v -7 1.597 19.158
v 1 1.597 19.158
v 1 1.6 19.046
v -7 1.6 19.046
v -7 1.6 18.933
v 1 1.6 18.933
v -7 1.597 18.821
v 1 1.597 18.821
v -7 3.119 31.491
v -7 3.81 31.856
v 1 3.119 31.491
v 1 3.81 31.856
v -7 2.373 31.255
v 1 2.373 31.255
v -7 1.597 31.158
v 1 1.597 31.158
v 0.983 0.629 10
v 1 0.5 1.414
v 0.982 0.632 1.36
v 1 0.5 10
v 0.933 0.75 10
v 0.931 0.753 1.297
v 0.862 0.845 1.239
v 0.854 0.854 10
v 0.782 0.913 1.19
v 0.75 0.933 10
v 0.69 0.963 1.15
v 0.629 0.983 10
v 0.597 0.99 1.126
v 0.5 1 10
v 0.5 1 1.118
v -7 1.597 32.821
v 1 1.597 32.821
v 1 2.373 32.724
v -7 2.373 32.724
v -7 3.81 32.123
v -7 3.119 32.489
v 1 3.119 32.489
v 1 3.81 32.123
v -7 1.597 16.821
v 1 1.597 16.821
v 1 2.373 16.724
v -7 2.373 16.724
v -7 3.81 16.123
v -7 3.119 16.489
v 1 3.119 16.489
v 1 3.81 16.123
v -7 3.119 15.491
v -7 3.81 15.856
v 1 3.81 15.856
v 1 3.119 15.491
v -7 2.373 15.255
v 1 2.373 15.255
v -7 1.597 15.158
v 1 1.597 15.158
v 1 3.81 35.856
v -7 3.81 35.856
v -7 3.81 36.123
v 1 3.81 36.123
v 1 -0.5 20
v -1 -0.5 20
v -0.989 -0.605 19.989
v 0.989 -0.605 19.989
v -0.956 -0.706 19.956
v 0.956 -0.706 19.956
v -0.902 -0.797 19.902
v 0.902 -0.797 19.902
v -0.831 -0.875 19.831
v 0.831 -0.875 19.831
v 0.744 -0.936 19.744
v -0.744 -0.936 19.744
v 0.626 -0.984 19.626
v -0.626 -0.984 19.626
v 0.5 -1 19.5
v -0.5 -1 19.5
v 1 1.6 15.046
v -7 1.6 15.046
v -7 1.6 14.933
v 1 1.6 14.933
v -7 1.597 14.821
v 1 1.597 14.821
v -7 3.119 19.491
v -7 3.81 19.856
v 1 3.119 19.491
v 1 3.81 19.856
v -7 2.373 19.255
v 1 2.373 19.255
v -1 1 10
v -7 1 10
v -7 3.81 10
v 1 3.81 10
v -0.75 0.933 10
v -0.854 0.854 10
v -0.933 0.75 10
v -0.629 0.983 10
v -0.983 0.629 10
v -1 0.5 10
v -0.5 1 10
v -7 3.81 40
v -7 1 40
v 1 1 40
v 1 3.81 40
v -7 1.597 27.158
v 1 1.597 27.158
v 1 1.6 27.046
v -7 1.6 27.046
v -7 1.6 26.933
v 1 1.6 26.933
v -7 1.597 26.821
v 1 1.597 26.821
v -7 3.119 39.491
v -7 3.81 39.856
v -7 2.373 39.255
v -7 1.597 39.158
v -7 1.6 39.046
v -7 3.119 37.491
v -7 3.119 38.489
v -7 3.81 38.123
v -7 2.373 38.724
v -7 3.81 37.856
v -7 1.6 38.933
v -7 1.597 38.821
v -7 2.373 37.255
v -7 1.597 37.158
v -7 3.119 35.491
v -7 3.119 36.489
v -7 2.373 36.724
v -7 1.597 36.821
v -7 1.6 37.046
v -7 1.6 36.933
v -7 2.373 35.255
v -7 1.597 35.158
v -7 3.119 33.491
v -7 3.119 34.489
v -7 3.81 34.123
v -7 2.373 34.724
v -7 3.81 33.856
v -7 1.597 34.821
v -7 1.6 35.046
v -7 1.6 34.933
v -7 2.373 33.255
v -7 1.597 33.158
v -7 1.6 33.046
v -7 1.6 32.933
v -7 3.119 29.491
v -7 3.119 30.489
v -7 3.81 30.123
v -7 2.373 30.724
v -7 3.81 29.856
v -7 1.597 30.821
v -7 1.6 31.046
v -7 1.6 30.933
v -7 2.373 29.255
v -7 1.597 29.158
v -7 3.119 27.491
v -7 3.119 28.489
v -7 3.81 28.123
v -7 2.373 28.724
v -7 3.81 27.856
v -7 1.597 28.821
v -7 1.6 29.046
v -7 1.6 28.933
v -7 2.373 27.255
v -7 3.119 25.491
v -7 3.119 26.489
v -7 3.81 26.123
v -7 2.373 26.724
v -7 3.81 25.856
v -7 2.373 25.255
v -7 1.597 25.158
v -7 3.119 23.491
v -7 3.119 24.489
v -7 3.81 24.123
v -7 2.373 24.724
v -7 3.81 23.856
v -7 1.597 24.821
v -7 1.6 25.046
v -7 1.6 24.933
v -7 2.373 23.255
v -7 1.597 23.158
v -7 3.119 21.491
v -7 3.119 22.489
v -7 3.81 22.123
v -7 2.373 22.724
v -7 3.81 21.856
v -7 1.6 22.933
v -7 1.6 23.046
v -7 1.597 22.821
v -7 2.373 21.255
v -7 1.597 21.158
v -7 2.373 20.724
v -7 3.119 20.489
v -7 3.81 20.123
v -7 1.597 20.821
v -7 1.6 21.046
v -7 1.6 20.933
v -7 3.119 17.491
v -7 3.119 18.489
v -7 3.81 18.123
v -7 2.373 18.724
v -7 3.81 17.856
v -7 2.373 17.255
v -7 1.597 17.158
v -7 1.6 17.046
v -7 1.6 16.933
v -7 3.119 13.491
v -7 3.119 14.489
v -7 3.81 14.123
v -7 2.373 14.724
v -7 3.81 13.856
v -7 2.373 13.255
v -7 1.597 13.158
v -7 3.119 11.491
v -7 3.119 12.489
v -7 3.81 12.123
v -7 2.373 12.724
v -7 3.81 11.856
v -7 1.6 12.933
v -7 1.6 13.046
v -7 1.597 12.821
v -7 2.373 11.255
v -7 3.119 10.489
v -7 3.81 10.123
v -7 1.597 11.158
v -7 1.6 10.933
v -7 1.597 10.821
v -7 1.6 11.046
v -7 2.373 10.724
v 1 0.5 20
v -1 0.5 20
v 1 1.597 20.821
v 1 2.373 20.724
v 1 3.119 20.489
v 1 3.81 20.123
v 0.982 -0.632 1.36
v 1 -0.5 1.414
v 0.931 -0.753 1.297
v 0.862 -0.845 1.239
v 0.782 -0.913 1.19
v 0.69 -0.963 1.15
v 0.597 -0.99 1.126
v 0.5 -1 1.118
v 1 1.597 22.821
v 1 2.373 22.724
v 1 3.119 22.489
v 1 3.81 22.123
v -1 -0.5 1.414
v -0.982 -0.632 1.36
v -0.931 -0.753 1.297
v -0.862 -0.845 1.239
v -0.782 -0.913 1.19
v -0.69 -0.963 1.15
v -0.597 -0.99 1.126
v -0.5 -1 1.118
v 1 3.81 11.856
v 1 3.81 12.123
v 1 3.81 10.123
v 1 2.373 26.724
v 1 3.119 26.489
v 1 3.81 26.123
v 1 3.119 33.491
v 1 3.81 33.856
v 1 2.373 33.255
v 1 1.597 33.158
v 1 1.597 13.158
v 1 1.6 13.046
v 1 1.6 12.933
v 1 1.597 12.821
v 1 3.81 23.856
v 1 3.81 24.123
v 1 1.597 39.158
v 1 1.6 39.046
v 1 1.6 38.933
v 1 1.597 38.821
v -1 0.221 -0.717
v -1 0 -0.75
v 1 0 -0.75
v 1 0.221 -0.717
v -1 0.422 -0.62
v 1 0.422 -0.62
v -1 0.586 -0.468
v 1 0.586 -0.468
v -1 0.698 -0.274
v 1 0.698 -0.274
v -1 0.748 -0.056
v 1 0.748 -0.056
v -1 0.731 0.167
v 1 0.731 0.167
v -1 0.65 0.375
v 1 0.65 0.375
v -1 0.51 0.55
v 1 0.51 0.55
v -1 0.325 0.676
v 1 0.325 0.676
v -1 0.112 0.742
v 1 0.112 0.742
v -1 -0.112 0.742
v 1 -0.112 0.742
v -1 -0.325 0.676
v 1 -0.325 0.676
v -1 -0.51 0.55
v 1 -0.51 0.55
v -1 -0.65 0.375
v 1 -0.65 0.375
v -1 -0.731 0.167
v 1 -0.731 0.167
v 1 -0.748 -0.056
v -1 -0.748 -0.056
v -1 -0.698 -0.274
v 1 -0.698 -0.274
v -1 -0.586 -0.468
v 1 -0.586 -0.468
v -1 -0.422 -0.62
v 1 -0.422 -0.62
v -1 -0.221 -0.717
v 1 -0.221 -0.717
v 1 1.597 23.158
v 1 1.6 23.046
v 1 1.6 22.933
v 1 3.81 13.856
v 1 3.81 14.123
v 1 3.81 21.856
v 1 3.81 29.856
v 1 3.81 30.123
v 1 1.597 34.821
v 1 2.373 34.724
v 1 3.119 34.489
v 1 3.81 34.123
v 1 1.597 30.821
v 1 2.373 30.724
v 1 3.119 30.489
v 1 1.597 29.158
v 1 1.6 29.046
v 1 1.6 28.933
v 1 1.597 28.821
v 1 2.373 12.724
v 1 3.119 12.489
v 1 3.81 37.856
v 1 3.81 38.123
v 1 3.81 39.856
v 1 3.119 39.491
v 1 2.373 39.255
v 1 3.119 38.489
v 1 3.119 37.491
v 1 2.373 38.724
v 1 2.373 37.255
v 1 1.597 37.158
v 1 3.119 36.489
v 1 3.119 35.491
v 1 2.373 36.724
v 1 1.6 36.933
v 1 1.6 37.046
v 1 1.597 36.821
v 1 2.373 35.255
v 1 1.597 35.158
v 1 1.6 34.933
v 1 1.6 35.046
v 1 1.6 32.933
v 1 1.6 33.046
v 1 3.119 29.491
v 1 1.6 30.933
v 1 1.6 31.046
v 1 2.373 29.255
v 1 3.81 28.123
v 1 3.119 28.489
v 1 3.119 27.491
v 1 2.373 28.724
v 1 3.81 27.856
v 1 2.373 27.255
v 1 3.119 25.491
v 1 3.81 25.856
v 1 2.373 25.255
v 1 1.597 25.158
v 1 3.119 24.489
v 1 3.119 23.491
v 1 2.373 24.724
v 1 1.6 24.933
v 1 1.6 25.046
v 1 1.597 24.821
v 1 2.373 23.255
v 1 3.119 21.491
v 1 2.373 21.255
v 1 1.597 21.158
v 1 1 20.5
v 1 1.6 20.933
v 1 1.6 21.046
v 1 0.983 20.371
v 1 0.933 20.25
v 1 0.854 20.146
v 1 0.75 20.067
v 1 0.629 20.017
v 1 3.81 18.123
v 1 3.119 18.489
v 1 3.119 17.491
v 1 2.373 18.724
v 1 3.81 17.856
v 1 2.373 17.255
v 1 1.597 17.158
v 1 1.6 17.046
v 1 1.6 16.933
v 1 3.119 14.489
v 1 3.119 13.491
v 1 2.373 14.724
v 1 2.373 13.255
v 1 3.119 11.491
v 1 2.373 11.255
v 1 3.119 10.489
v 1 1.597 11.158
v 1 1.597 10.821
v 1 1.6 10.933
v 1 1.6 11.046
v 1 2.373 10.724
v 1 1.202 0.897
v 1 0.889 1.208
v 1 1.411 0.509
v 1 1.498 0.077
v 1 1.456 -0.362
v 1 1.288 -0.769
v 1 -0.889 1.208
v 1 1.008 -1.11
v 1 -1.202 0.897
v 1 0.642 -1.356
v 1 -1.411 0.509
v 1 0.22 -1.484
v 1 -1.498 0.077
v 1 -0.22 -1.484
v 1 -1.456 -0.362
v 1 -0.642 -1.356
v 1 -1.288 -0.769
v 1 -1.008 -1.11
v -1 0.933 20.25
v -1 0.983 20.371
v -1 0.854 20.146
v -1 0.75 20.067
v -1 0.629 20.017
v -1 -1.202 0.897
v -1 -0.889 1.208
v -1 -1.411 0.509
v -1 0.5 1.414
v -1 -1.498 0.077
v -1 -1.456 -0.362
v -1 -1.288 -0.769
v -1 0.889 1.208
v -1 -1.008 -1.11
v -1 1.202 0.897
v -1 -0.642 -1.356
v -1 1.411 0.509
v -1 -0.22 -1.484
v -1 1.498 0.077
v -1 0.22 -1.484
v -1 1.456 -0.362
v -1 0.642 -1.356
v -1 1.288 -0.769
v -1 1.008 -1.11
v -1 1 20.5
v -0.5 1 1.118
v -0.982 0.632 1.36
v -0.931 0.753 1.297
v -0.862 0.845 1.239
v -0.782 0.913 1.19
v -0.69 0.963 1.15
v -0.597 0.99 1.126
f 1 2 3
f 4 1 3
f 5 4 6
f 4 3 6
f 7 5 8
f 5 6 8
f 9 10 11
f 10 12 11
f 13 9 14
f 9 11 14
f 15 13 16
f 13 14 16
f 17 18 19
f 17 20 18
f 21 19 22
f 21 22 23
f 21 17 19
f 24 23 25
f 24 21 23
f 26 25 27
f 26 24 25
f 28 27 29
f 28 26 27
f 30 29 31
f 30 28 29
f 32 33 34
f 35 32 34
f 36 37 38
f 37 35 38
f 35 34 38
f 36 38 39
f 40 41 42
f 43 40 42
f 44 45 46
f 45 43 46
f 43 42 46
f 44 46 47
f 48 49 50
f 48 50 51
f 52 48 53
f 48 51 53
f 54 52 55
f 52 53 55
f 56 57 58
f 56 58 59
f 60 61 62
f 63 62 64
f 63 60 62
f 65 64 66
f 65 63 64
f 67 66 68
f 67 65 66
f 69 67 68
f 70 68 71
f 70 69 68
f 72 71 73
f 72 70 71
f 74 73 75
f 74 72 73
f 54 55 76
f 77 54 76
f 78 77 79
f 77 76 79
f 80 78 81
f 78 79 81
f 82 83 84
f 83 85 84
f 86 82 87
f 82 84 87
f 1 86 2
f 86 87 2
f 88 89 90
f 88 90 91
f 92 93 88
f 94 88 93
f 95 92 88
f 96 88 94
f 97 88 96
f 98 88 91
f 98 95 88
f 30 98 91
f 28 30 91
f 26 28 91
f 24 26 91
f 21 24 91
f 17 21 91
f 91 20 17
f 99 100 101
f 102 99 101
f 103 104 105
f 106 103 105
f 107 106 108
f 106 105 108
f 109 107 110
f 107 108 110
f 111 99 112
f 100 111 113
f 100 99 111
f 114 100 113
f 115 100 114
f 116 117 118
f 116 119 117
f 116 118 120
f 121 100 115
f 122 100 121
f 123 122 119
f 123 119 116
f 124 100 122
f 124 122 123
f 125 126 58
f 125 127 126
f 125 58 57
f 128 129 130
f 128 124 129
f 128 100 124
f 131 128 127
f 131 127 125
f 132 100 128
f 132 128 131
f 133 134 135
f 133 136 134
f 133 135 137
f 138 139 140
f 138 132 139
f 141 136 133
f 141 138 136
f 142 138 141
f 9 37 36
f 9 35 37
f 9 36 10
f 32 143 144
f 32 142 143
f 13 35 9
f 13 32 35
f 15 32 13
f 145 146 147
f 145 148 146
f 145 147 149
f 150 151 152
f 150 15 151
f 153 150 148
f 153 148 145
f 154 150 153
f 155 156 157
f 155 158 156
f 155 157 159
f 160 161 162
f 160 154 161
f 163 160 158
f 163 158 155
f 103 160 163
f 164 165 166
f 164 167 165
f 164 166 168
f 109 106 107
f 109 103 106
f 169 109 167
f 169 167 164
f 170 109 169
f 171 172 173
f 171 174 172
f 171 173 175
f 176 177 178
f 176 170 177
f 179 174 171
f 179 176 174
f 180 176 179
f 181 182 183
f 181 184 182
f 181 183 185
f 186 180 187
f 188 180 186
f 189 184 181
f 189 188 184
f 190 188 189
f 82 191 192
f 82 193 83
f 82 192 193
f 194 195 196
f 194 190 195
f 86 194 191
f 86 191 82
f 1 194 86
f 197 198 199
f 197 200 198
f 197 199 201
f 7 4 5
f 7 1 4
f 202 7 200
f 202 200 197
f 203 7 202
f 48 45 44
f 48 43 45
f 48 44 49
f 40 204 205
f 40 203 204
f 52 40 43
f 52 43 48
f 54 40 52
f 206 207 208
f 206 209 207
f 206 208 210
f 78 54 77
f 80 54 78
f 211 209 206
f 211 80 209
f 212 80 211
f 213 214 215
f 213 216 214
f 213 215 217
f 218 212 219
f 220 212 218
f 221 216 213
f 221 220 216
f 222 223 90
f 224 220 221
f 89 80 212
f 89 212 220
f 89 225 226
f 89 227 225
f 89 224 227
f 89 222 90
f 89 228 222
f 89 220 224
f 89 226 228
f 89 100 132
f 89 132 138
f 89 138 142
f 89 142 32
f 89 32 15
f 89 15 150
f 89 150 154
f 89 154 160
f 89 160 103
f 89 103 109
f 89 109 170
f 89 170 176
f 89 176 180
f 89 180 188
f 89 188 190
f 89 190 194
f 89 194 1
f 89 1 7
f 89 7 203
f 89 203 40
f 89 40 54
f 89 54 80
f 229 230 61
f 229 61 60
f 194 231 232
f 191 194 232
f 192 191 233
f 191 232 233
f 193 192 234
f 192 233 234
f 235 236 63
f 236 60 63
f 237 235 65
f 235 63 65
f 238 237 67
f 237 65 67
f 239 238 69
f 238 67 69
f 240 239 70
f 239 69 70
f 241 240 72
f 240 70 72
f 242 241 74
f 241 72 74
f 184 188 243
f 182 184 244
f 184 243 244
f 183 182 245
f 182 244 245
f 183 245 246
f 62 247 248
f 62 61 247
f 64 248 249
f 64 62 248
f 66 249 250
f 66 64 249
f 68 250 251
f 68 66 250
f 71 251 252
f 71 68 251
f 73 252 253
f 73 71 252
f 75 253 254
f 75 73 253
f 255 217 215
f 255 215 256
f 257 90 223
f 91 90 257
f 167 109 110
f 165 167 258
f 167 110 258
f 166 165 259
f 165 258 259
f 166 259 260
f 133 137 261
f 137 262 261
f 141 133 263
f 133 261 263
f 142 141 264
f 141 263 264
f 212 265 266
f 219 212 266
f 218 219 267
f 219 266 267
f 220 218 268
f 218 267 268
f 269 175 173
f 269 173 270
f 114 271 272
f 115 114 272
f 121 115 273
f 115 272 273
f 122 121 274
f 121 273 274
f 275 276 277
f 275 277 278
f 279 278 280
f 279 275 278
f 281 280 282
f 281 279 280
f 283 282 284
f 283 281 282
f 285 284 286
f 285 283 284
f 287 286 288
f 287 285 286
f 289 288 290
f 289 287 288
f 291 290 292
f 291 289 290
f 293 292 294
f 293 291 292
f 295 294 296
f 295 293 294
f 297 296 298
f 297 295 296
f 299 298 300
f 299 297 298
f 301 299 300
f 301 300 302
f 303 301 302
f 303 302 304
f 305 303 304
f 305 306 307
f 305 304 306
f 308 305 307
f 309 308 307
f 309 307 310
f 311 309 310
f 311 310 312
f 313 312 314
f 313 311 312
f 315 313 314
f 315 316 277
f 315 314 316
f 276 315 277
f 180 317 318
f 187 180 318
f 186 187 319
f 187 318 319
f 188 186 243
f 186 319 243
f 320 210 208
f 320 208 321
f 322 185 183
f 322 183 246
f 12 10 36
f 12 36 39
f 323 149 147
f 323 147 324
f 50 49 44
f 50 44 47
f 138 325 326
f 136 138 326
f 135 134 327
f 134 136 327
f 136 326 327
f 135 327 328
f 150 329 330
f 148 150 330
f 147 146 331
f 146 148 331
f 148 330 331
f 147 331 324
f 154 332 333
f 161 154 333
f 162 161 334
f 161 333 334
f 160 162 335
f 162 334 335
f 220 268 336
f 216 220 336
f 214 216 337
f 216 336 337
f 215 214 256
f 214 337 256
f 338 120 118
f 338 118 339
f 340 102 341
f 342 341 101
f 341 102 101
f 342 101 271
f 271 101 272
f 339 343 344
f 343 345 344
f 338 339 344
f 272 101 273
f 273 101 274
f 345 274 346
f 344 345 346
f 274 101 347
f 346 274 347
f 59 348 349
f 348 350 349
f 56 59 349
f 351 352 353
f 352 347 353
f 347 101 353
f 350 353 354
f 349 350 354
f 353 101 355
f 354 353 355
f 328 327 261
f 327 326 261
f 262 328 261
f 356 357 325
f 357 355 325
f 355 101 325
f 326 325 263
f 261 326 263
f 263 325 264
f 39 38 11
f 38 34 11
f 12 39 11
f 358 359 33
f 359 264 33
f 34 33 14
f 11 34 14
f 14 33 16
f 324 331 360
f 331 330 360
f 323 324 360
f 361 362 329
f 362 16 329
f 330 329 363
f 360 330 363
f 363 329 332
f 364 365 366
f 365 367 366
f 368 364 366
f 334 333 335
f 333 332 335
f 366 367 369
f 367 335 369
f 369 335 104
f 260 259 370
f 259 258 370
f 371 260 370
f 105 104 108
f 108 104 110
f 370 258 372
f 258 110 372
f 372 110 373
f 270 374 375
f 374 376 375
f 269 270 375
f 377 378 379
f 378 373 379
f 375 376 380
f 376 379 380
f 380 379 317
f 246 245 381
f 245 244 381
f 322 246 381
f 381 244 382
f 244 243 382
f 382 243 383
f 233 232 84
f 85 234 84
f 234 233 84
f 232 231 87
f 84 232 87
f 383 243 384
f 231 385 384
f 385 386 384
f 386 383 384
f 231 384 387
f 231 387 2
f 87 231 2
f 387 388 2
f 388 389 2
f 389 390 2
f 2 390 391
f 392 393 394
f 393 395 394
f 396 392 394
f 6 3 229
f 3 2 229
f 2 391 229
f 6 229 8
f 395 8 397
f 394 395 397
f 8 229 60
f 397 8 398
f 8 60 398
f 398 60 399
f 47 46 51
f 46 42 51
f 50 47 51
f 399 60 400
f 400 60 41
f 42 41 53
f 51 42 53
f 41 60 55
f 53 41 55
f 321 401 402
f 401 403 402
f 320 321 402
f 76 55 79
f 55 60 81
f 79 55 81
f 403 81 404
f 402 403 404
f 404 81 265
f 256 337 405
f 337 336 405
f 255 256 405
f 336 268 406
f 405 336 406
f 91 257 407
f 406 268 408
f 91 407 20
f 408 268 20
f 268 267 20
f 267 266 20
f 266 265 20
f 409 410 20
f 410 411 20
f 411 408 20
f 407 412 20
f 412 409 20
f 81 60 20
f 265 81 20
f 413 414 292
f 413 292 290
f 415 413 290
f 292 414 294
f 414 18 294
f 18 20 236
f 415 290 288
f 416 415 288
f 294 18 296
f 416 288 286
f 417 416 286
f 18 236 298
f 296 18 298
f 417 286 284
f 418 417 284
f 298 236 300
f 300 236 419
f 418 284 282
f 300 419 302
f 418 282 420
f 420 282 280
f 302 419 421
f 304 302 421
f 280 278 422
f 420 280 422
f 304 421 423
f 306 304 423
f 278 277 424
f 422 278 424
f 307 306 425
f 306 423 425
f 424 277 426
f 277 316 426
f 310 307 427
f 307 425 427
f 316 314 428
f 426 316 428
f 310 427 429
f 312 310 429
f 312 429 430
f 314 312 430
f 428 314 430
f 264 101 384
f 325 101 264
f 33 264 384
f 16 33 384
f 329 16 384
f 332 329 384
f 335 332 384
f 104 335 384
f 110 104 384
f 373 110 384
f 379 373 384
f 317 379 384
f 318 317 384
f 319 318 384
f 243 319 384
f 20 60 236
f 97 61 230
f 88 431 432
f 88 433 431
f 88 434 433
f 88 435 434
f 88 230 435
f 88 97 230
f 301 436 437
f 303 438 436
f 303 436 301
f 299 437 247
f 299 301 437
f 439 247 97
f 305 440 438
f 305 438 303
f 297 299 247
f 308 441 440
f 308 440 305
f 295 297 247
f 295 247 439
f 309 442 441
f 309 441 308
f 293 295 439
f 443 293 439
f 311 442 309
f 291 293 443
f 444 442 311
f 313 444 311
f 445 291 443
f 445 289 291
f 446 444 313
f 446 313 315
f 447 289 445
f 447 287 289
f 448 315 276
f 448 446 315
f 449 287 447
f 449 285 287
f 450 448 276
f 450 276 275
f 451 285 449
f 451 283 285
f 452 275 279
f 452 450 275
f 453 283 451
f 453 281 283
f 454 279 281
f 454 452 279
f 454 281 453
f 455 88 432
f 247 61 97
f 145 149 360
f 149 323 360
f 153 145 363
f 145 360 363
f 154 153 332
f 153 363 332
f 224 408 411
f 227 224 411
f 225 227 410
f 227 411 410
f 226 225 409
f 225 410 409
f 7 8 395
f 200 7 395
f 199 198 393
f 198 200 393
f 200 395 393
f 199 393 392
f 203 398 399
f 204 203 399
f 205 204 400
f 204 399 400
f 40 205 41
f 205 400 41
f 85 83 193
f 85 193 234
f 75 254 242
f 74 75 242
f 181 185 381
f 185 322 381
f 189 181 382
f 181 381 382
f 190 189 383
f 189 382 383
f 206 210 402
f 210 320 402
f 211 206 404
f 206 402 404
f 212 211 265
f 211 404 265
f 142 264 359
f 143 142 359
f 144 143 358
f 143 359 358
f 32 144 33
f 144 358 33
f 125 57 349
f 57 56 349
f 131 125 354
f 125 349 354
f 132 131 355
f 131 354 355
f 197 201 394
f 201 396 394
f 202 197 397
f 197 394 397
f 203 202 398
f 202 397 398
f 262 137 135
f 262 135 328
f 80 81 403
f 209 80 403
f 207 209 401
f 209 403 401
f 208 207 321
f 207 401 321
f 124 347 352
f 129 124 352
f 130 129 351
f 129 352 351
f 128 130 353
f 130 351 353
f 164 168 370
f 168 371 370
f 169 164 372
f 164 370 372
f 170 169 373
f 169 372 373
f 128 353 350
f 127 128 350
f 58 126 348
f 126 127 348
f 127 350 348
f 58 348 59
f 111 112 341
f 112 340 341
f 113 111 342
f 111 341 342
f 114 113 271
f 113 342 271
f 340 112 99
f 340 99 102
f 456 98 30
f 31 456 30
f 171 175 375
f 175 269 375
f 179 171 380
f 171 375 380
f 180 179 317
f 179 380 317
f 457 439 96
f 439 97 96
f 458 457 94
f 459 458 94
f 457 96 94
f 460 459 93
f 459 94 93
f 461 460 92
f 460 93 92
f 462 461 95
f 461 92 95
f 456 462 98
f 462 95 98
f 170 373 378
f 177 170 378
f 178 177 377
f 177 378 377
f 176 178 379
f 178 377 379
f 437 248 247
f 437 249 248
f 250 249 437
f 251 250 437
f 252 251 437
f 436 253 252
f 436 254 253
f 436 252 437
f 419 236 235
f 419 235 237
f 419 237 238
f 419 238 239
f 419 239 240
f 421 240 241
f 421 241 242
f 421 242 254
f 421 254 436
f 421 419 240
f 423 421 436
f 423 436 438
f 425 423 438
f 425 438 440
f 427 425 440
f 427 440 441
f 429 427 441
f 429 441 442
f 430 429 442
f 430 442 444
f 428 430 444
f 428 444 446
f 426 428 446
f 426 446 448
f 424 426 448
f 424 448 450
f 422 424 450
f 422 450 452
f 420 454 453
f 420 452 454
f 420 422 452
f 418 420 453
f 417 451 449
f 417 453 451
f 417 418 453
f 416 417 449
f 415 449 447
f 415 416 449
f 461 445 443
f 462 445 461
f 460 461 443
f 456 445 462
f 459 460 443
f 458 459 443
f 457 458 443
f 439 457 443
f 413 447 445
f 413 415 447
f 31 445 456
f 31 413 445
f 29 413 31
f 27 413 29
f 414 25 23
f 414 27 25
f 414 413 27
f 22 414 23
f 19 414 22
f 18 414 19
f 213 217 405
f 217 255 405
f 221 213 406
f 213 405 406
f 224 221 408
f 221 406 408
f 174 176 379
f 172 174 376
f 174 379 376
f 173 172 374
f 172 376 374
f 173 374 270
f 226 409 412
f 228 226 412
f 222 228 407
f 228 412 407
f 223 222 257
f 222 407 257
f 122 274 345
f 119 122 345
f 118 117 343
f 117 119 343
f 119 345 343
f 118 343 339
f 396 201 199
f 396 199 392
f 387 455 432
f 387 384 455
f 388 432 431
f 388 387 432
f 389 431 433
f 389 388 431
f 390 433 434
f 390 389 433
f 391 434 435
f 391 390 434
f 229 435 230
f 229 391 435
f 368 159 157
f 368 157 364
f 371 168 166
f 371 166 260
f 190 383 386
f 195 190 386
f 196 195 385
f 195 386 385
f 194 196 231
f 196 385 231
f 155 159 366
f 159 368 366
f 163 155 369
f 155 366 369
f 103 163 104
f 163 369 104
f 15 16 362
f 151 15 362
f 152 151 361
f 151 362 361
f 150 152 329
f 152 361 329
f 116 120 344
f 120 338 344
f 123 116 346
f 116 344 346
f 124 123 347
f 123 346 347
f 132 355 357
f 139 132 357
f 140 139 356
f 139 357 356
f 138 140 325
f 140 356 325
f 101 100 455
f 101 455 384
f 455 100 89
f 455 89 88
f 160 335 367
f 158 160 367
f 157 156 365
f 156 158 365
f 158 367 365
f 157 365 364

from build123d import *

# Parameters (mm, degrees)
SKETCH1_W                       = 2
SKETCH1_H                       = 2
BOSS_EXTRUDE1_DEPTH             = 20
BOSS_EXTRUDE2_REACH             = 22.05
SKETCH2_R                       = 1.5
BOSS_EXTRUDE2_DIRECTION_2_REACH = 22.05
CUT_EXTRUDE1_DEPTH              = 21.081085628
CUT_EXTRUDE1_DEPTH_BACK         = 21.081085628
SKETCH3_R                       = 0.75
SKETCH4_W                       = 8
SKETCH4_H                       = 30
BOSS_EXTRUDE4_DEPTH             = 2.81
CUT_EXTRUDE3_DEPTH              = 41.78622439
LPATTERN1_COUNT                 = 14
LPATTERN1_PITCH                 = 2
LPATTERN1_COL_COUNT             = 2
LPATTERN1_COL_PITCH             = 2
FILLET2_R                       = 0.5


with BuildPart() as part:
    # Sketch1 → Boss-Extrude1 (new body)
    with BuildSketch(Plane.XY):
        Rectangle(SKETCH1_W, SKETCH1_H)
    extrude(amount=BOSS_EXTRUDE1_DEPTH)

    # Boss-Extrude2: up to this face of the body (flat: up to its plane)
    boss_extrude2_end = Plane(part.part.faces().sort_by_distance((1, 0, 10))[0])
    # Sketch2 → Boss-Extrude2 (add, up to the picked face)
    with BuildSketch(Plane(origin=(0, 0, 0), x_dir=(0, 0, -1), z_dir=(1, 0, 0)), mode=Mode.PRIVATE) as boss_extrude2_sk1:
        Circle(SKETCH2_R)
    boss_extrude2_tool1 = split(extrude(boss_extrude2_sk1.sketch, amount=BOSS_EXTRUDE2_REACH, mode=Mode.PRIVATE), bisect_by=boss_extrude2_end, keep=Keep.BOTH, mode=Mode.PRIVATE)
    add(boss_extrude2_tool1.solids().sort_by(Axis((0, 0, 0), (1, 0, 0)))[0])

    # Boss-Extrude2 direction 2: up to this face of the body (flat: up to its plane)
    boss_extrude2_direction_2_end = Plane(part.part.faces().sort_by_distance((-1, 0, 10))[0])
    # Sketch2 → Boss-Extrude2 direction 2 (add, up to the picked face)
    with BuildSketch(Plane(origin=(0, 0, 0), x_dir=(0, 0, -1), z_dir=(1, 0, 0)), mode=Mode.PRIVATE) as boss_extrude2_direction_2_sk1:
        Circle(SKETCH2_R)
    boss_extrude2_direction_2_tool1 = split(extrude(boss_extrude2_direction_2_sk1.sketch, amount=-BOSS_EXTRUDE2_DIRECTION_2_REACH, mode=Mode.PRIVATE), bisect_by=boss_extrude2_direction_2_end, keep=Keep.BOTH, mode=Mode.PRIVATE)
    add(boss_extrude2_direction_2_tool1.solids().sort_by(Axis((0, 0, 0), (-1, 0, 0)))[0])

    # Sketch3 → Cut-Extrude1 (cut, two sides: drawn at the far end of the back side and taken through both)
    with BuildSketch(Plane(origin=(0, 0, 0), x_dir=(0, 0, -1), z_dir=(1, 0, 0)).offset(-CUT_EXTRUDE1_DEPTH_BACK)):
        Circle(SKETCH3_R)
    extrude(amount=CUT_EXTRUDE1_DEPTH + CUT_EXTRUDE1_DEPTH_BACK, mode=Mode.SUBTRACT)

    # Sketch4 → Boss-Extrude4 (add)
    with BuildSketch(Plane(origin=(0, 1, 0), x_dir=(1, 0, 0), z_dir=(0, 1, 0))):
        with Locations((-3, -25)):
            Rectangle(SKETCH4_W, SKETCH4_H)
    extrude(amount=BOSS_EXTRUDE4_DEPTH)

    # Sketch9 → Cut-Extrude3 (cut, symmetric)
    with BuildSketch(Plane(origin=(0, 0, 0), x_dir=(0, 0, -1), z_dir=(1, 0, 0))):
        with BuildLine():
            ThreePointArc((-38.315329673, 4.397253742), (-37.483653354, 3.101788083), (-37.158231048, 1.597122972))
            ThreePointArc((-37.158231048, 1.597122972), (-36.989658323, 1.6), (-36.821085598, 1.597122972))
            ThreePointArc((-36.821085598, 1.597122972), (-36.495663293, 3.101788083), (-35.663986973, 4.397253742))
            ThreePointArc((-35.663986973, 4.397253742), (-36.989658323, 4.51), (-38.315329673, 4.397253742))
        make_face()
    cut_extrude3 = extrude(amount=CUT_EXTRUDE3_DEPTH, both=True, mode=Mode.SUBTRACT)

    # LPattern1: Cut-Extrude3 ×14
    with Locations(*[(0, 0, -i * LPATTERN1_PITCH) for i in range(1, LPATTERN1_COUNT)]):
        add(cut_extrude3, mode=Mode.SUBTRACT)

    # LPattern1 col: Cut-Extrude3 ×2
    with Locations(*[(0, 0, i * LPATTERN1_COL_PITCH) for i in range(1, LPATTERN1_COL_COUNT)]):
        add(cut_extrude3, mode=Mode.SUBTRACT)

    # Fillet2
    fillet2_edges = [part.edges().sort_by_distance(p)[0] for p in [
        (-1, -1, 10.559016994),
        (1, -1, 10.559016994),
        (1, 1, 5.559016994),
        (-1, 1, 5.559016994),
        (0, -1, 20),
        (0, 1, 20),
    ]]
    fillet(fillet2_edges, radius=FILLET2_R)


solid = part.part
